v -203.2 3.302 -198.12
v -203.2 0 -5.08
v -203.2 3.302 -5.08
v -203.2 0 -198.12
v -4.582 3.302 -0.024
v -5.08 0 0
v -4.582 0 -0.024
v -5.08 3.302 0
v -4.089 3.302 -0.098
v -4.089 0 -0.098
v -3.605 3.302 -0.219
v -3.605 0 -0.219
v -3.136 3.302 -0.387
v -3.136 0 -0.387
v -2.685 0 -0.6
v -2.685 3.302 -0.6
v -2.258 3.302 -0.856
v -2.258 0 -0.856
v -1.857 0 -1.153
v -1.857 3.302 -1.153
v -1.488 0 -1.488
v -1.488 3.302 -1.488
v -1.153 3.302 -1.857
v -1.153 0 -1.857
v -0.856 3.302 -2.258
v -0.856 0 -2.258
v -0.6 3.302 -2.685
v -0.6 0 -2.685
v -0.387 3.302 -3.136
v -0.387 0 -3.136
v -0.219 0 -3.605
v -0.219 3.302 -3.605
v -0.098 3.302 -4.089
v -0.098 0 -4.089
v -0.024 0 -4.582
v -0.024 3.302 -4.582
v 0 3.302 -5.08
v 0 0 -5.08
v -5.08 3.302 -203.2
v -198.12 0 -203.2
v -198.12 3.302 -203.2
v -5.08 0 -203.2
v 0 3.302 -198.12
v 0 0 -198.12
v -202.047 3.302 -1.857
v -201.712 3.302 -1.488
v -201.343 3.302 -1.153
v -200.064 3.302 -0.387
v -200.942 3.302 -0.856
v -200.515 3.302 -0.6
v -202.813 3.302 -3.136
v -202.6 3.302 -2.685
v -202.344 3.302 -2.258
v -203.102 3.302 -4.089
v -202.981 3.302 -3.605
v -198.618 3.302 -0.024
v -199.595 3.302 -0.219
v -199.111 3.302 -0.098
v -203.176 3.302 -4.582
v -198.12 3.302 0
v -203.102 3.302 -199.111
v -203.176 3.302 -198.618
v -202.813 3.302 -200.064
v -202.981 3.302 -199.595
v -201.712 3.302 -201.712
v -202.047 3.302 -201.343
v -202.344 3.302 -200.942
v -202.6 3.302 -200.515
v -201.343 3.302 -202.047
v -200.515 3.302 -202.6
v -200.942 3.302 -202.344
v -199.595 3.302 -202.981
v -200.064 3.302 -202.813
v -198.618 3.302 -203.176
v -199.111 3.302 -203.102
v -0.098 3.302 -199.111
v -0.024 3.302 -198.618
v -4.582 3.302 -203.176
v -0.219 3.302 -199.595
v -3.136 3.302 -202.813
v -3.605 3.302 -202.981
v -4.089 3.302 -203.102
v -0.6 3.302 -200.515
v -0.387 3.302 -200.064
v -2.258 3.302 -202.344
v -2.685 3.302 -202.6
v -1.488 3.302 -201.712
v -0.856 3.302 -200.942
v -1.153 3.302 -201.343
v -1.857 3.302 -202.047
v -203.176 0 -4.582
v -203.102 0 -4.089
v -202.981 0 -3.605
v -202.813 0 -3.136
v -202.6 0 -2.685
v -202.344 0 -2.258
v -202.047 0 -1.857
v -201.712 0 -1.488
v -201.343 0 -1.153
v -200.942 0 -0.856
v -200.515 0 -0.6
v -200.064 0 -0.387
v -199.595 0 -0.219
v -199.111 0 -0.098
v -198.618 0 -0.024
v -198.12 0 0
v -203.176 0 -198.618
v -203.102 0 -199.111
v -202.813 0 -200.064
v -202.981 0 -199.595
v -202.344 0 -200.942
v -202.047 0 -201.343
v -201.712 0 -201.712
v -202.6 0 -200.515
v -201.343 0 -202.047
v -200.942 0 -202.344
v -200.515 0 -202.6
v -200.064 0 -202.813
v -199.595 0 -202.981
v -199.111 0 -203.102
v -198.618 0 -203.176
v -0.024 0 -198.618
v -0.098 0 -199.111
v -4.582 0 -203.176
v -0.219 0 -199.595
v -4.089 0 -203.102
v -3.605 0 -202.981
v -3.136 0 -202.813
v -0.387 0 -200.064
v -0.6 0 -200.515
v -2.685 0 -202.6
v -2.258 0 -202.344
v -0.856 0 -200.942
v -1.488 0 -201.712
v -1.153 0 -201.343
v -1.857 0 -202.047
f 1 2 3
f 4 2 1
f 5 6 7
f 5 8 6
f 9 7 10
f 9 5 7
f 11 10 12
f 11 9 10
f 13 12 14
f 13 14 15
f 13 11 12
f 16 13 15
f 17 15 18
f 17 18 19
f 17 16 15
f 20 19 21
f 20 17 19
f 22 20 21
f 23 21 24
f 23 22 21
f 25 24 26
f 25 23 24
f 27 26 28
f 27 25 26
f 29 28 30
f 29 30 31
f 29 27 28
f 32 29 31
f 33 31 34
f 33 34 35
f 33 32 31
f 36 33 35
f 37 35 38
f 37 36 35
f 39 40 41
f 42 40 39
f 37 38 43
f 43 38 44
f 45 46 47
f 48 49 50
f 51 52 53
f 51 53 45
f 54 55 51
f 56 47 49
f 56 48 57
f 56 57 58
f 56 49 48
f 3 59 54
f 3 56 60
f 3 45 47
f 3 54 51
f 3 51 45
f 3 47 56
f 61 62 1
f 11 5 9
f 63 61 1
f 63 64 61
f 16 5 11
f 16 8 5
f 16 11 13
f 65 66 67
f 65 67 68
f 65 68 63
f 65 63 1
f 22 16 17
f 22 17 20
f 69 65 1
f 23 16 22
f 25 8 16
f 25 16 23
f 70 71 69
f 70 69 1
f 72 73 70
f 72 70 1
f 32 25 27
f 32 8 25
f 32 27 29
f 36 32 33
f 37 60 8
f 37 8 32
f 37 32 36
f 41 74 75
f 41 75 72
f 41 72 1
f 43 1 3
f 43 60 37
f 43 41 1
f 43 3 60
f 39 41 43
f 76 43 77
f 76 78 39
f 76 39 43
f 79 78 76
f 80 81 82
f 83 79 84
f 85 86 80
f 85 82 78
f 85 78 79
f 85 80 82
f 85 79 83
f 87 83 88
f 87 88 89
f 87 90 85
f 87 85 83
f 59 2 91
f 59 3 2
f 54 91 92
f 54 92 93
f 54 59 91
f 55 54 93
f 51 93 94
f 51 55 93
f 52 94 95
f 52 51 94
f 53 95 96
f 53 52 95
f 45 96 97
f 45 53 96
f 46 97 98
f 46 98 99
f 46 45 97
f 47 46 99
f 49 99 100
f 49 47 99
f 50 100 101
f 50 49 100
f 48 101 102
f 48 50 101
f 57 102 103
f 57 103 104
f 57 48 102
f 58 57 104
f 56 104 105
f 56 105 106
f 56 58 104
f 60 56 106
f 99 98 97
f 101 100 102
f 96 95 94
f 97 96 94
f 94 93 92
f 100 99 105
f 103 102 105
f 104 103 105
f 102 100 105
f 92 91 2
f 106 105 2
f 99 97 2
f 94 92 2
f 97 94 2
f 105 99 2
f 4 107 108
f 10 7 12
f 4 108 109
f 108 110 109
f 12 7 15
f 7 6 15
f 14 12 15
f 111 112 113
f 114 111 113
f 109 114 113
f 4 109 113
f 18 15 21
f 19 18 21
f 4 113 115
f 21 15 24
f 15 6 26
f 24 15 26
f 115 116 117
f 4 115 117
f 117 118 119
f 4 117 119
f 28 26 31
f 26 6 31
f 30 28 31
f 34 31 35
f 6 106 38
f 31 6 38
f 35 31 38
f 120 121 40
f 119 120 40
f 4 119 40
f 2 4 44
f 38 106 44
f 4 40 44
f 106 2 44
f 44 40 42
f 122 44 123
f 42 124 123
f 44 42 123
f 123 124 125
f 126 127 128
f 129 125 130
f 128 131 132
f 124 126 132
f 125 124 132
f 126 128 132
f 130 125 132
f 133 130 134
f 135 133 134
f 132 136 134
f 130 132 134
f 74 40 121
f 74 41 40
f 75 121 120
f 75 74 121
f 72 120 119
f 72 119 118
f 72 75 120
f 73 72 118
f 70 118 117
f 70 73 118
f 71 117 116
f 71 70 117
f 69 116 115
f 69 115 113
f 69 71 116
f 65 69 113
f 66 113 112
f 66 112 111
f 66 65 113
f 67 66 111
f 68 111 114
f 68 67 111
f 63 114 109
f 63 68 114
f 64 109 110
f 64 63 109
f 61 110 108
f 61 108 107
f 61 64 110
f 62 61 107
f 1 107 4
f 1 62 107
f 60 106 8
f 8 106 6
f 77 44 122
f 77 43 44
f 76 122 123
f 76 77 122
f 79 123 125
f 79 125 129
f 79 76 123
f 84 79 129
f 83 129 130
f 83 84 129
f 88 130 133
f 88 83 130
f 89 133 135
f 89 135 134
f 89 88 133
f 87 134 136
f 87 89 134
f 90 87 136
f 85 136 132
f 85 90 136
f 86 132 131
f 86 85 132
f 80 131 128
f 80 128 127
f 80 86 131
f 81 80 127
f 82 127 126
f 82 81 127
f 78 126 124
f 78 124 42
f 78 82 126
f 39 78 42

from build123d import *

# Parameters (mm, degrees)
SKETCH3_W           = 203.2
SKETCH3_H           = 203.2
BOSS_EXTRUDE1_DEPTH = 3.302
FILLET1_R           = 5.08
FILLET2_R           = 5.08
FILLET3_R           = 5.08
FILLET4_R           = 5.08


with BuildPart() as part:
    # Sketch3 → Boss-Extrude1 (new body)
    with BuildSketch(Plane(origin=(0, 0, 0), x_dir=(1, 0, 0), z_dir=(0, 1, 0))):
        with Locations((-101.6, 101.6)):
            Rectangle(SKETCH3_W, SKETCH3_H)
    extrude(amount=BOSS_EXTRUDE1_DEPTH)

    # Fillet1
    fillet1_edges = [part.edges().sort_by_distance(p)[0] for p in [
        (-203.2, 1.651, 0),
    ]]
    fillet(fillet1_edges, radius=FILLET1_R)

    # Fillet2
    fillet2_edges = [part.edges().sort_by_distance(p)[0] for p in [
        (0, 1.651, 0),
    ]]
    fillet(fillet2_edges, radius=FILLET2_R)

    # Fillet3
    fillet3_edges = [part.edges().sort_by_distance(p)[0] for p in [
        (0, 1.651, -203.2),
    ]]
    fillet(fillet3_edges, radius=FILLET3_R)

    # Fillet4
    fillet4_edges = [part.edges().sort_by_distance(p)[0] for p in [
        (-203.2, 1.651, -203.2),
    ]]
    fillet(fillet4_edges, radius=FILLET4_R)


solid = part.part
